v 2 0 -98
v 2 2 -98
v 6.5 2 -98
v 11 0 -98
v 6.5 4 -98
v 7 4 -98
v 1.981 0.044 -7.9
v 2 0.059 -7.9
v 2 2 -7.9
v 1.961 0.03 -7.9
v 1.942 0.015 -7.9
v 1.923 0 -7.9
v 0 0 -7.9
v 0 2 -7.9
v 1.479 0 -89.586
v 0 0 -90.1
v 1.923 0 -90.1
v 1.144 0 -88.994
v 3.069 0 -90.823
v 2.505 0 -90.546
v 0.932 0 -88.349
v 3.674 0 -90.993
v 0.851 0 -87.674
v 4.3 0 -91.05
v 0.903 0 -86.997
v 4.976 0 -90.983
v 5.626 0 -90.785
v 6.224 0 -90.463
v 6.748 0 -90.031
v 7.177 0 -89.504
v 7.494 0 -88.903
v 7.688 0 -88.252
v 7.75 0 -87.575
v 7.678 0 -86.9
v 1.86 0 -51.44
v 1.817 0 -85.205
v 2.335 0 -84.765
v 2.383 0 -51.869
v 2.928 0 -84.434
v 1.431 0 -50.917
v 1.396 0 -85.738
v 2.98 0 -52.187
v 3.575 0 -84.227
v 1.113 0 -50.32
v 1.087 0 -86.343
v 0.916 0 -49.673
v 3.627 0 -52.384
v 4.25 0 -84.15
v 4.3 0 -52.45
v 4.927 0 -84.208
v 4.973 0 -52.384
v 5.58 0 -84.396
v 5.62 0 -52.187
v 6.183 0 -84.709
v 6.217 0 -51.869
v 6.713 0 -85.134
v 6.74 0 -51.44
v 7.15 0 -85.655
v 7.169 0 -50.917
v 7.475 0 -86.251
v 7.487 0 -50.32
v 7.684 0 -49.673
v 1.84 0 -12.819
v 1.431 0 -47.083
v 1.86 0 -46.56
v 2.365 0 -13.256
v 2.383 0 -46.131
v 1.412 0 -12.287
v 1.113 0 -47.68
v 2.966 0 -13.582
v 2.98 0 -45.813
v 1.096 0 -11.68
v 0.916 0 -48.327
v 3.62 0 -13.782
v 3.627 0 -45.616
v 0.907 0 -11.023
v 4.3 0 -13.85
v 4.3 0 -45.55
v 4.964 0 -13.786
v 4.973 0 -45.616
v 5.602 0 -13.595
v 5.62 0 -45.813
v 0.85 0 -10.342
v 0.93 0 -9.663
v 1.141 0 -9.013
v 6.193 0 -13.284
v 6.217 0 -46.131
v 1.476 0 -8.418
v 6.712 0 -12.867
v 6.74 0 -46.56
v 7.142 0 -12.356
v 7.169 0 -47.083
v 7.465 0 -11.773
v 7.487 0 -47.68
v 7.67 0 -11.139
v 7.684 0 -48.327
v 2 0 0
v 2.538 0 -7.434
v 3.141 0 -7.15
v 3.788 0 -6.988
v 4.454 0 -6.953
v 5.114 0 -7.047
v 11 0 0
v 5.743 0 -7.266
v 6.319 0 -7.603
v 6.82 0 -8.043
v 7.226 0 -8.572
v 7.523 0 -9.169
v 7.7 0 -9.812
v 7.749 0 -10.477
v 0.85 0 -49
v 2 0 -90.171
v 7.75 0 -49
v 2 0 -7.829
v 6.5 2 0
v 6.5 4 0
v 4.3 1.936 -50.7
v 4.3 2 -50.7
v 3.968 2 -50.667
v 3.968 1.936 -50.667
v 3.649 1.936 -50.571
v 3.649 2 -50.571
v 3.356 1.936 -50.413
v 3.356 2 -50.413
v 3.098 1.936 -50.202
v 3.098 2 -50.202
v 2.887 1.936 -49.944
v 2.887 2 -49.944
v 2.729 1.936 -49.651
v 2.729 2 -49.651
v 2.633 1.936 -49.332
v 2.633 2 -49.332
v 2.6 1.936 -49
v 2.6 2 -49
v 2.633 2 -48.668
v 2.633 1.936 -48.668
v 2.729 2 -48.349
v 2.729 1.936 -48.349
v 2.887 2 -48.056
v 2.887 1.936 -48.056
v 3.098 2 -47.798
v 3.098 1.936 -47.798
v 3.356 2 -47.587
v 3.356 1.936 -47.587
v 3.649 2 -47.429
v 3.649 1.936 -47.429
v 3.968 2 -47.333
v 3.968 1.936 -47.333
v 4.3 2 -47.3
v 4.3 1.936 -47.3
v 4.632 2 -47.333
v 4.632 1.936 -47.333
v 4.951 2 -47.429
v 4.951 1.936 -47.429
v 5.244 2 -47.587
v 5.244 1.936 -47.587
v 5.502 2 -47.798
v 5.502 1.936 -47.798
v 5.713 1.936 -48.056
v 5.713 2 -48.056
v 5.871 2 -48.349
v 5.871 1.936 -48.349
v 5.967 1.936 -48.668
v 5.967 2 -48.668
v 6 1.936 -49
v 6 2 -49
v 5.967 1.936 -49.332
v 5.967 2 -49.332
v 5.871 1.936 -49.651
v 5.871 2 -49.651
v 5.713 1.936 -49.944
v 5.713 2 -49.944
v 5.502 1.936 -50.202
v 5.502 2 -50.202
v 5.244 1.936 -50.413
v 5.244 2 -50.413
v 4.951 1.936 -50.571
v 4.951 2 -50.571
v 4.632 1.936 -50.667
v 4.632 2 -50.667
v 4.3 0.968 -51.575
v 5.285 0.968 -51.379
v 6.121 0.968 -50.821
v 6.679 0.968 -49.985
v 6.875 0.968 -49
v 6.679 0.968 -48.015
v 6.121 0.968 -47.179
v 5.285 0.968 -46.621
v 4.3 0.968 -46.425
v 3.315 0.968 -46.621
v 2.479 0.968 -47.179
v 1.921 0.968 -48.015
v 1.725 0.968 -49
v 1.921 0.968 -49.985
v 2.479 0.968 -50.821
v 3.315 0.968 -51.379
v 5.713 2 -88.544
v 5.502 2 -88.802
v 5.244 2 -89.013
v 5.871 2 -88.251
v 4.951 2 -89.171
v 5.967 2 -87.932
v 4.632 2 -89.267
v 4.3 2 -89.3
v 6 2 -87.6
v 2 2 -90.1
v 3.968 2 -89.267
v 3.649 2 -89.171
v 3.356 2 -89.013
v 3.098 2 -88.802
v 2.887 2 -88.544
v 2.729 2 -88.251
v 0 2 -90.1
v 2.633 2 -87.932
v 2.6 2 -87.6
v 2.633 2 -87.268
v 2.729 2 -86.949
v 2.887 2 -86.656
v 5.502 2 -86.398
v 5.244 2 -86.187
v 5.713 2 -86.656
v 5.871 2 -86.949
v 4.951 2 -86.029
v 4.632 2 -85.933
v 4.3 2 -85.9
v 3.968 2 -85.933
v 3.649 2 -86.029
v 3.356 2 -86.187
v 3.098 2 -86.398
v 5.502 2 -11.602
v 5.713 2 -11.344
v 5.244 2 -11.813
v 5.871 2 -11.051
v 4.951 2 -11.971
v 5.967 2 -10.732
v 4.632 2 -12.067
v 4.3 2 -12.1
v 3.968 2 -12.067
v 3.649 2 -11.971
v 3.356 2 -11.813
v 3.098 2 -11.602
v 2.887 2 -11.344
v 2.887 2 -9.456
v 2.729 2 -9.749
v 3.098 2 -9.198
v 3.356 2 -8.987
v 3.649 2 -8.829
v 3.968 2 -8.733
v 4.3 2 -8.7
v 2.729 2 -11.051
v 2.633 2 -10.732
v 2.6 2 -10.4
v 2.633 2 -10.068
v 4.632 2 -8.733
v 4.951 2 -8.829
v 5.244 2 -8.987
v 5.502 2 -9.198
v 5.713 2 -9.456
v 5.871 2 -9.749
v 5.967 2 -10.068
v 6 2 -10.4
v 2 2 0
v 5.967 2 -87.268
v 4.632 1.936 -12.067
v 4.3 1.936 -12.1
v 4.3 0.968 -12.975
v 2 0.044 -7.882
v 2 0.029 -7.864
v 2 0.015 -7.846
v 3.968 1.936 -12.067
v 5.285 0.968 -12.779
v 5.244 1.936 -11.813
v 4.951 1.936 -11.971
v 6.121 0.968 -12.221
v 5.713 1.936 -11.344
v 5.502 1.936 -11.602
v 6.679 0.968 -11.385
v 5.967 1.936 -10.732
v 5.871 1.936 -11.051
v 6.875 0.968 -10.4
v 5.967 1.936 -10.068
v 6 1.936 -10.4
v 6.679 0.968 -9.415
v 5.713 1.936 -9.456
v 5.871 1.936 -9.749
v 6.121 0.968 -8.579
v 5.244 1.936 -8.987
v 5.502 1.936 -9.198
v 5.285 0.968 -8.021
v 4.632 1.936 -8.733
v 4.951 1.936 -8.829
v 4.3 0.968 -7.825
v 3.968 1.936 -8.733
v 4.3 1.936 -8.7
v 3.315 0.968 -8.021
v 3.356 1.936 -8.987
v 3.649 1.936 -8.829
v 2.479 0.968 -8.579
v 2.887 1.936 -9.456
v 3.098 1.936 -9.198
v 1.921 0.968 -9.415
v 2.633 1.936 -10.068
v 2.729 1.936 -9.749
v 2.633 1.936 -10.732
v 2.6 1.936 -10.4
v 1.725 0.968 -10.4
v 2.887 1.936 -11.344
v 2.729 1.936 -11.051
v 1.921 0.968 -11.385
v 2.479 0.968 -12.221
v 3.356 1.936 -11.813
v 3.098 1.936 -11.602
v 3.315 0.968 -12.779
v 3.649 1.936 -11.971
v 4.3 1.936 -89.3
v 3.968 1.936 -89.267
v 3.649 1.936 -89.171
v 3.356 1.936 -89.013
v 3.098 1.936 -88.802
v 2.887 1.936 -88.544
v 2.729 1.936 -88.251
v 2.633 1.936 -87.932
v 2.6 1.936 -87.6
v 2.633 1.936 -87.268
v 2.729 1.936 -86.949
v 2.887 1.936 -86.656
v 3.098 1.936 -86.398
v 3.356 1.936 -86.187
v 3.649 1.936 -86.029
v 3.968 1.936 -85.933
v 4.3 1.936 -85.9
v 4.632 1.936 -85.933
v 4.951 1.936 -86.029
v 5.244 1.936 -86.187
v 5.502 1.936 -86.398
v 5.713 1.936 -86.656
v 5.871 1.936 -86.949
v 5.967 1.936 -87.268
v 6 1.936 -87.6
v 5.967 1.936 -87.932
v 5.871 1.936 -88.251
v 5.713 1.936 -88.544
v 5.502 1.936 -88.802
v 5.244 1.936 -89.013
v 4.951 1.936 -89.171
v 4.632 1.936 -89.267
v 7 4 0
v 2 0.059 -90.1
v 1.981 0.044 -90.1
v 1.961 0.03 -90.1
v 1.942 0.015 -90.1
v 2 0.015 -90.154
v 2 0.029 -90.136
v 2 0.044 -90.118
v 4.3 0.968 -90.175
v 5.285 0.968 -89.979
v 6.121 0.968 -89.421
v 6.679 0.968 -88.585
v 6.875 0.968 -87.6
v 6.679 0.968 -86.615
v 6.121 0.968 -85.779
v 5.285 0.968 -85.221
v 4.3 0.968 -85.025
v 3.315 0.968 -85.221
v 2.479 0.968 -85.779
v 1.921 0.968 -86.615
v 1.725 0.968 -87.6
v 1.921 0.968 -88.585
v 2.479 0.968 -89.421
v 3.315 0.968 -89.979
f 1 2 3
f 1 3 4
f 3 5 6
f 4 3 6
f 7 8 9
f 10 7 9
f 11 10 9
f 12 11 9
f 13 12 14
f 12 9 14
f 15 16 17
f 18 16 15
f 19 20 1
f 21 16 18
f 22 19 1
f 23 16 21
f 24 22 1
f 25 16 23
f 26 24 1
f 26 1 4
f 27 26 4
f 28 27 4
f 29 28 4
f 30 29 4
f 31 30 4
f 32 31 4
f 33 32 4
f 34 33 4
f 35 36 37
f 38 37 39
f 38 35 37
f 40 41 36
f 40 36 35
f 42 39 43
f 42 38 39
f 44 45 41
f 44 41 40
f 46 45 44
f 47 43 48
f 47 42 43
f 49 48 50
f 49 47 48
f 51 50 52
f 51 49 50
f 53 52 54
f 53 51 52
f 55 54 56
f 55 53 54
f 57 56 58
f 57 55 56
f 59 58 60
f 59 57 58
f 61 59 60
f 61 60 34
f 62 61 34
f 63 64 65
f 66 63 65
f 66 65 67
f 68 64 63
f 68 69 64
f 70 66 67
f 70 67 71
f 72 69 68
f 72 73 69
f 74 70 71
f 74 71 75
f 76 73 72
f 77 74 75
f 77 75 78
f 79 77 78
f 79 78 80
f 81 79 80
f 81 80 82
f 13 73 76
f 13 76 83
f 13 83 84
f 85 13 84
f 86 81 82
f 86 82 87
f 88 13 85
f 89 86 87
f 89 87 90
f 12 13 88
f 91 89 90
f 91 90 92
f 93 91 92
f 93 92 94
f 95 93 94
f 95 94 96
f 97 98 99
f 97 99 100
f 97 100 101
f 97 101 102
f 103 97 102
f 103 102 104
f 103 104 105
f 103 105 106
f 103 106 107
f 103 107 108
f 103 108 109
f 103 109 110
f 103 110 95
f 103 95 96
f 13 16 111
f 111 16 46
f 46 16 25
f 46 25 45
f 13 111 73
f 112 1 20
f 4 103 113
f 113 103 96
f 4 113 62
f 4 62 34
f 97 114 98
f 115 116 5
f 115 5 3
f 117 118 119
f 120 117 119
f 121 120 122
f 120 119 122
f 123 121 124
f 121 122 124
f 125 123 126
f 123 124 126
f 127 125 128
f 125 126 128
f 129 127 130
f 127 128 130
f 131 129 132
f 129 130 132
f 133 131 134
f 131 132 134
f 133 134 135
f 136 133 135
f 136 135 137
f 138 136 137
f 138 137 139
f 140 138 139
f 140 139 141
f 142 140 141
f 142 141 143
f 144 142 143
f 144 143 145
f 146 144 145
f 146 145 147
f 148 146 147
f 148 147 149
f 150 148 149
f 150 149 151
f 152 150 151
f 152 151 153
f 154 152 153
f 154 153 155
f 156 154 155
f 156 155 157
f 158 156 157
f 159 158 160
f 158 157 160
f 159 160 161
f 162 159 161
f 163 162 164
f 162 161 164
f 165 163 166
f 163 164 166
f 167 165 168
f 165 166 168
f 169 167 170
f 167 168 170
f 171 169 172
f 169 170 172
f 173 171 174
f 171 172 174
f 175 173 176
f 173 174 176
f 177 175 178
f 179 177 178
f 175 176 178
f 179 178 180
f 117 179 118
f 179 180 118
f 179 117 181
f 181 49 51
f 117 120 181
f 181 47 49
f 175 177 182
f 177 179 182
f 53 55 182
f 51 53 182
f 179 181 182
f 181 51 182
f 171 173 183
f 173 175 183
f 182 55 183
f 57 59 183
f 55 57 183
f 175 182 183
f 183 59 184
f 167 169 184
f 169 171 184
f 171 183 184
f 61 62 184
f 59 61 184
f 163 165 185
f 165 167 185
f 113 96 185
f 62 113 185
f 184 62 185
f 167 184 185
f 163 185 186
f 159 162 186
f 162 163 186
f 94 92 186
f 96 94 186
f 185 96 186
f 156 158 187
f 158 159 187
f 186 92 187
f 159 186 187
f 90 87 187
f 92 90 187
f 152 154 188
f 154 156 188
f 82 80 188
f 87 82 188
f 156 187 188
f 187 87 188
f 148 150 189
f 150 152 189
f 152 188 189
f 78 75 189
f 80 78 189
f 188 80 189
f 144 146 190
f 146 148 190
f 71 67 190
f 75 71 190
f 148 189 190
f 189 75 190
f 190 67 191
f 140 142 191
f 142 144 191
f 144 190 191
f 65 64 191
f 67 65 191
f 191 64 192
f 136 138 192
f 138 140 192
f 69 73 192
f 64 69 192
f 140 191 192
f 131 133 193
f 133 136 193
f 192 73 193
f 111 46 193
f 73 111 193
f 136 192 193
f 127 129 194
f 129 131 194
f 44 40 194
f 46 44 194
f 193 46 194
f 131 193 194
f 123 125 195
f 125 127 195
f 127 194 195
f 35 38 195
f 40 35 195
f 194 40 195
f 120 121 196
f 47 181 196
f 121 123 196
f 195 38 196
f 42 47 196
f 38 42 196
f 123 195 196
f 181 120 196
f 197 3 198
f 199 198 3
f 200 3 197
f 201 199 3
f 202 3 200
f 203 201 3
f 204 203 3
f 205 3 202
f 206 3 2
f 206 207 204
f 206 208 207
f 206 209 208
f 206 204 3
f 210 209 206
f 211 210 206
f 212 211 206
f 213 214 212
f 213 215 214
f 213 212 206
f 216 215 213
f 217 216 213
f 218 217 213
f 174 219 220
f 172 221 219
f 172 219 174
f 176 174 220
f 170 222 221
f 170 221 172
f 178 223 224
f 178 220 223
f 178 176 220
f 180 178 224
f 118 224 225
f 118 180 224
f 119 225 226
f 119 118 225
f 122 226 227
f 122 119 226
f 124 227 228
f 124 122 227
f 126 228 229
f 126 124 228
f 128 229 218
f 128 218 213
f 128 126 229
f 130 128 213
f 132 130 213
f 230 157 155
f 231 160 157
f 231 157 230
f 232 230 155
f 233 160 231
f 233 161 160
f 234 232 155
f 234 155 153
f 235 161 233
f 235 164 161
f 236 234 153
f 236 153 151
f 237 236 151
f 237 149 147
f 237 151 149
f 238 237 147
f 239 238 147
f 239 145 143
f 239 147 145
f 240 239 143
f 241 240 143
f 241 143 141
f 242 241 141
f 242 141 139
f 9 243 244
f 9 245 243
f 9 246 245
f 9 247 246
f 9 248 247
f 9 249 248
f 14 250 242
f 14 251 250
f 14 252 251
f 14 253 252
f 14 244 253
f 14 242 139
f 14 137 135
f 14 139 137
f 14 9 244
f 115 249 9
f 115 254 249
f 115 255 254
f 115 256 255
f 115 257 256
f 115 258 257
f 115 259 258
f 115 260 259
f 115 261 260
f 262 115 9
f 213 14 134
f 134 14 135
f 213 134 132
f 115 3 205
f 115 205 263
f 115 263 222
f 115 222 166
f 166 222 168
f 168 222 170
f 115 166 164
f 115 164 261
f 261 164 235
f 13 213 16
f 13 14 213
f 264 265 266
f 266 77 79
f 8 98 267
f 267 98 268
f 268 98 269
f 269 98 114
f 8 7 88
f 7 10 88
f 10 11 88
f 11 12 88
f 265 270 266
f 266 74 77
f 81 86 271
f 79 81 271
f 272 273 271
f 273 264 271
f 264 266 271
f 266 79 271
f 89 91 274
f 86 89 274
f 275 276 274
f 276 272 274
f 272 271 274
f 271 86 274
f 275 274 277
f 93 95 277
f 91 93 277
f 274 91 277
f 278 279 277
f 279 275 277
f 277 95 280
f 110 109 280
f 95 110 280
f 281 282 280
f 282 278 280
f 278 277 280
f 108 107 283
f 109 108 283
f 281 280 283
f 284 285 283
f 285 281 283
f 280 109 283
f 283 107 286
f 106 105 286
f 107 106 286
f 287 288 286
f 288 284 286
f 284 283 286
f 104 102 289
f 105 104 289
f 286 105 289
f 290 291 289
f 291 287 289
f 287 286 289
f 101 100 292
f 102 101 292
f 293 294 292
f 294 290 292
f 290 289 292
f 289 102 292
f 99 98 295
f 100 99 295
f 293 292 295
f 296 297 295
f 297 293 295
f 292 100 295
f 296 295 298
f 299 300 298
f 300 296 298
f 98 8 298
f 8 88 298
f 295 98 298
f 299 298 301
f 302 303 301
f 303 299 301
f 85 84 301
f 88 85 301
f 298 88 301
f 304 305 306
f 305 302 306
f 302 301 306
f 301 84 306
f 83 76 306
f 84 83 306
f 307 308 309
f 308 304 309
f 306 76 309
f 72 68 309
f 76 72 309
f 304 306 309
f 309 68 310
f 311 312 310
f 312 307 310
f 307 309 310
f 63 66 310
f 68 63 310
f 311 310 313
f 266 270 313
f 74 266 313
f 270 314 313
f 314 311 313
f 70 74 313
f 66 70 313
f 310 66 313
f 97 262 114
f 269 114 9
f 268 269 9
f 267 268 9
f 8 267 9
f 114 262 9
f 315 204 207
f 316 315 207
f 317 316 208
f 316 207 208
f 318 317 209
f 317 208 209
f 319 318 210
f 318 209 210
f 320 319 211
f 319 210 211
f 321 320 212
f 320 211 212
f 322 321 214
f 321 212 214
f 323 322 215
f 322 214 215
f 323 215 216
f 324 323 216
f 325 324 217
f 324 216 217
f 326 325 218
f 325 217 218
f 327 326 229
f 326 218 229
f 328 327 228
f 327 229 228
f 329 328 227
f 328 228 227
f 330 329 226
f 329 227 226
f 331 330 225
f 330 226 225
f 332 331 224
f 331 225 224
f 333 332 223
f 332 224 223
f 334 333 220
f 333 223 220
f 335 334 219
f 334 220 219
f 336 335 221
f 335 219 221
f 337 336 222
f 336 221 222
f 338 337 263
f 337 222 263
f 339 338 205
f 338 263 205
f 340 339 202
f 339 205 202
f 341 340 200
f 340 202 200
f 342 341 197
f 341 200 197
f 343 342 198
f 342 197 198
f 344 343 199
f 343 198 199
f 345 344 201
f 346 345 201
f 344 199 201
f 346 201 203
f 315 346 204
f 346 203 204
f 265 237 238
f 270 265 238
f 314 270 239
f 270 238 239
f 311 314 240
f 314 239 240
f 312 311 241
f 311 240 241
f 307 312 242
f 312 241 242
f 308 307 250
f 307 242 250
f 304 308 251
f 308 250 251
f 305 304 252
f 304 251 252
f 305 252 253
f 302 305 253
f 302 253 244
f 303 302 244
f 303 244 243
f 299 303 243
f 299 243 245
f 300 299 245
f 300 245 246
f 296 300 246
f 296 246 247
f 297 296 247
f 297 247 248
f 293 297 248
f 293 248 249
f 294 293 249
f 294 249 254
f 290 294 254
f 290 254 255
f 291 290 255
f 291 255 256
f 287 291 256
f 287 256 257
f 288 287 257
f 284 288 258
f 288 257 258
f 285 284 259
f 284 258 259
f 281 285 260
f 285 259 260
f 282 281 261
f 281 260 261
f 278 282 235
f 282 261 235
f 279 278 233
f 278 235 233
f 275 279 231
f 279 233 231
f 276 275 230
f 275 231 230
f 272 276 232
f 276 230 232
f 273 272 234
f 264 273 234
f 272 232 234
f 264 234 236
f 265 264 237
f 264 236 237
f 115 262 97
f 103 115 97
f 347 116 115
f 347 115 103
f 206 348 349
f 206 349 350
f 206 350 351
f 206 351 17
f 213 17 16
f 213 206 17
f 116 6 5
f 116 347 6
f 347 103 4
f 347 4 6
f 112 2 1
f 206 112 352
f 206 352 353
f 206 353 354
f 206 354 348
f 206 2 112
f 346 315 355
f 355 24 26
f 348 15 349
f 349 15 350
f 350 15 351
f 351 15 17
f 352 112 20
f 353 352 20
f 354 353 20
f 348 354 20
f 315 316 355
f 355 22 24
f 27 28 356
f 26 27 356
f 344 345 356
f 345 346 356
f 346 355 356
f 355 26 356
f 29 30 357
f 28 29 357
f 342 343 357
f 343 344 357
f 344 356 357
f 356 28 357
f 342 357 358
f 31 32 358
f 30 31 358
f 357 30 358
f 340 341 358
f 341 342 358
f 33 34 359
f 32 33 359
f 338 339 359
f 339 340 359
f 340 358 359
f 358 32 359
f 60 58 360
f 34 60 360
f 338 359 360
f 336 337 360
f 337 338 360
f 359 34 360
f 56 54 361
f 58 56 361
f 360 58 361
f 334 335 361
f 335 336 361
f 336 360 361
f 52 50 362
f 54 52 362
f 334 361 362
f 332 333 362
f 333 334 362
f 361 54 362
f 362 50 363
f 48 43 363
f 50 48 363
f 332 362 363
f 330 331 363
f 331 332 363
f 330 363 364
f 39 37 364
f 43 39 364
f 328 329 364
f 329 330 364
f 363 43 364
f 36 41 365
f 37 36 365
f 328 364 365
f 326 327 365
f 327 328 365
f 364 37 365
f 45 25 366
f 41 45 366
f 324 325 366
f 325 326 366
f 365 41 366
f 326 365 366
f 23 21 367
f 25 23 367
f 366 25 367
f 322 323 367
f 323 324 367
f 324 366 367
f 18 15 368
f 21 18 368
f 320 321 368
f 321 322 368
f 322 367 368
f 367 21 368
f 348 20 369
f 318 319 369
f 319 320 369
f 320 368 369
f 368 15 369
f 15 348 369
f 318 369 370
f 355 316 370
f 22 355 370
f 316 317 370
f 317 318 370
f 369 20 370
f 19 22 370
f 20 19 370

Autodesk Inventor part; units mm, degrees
ref_plane "YZ Plane" through (0, 0, 0) normal (1, 0, 0) x (0, 1, 0)
ref_plane "XZ Plane" through (0, 0, 0) normal (0, 1, 0) x (-1, 0, 0)
ref_plane "XY Plane" through (0, 0, 0) normal (0, 0, 1) x (1, 0, 0)
sketch "Szkic1" plane through (0, 0, 0) normal (0, 0, 1) x (1, 0, 0)
  line L0 (0, 0) -> (11, 0)
  line L1 (11, 0) -> (7, 4)
  line L2 (7, 4) -> (6.5, 4)
  line L3 (6.5, 4) -> (6.5, 2)
  line L4 (6.5, 2) -> (0, 2)
  line L5 (0, 2) -> (0, 0)
  dimension "d1" = 45
  dimension "d3" = 2
  dimension "d4" = 2
  dimension "d5" = 11
  dimension "d19" = 4.5
extrude "Wyciągnięcie proste1" add sketch "Szkic1" against normal blind 98
sketch "Szkic4" plane through (0, 0, 0) normal (0, -1, 0) x (1, 0, 0)
  line L0 (0, 0) -> (0, -98) construction
  line L1 (0, -49) -> (11, -49) construction
  line L2 (11, 0) -> (11, -98) construction
  line L3 (4.3, -10.4) -> (4.3, -49) construction
  line L4 (6.5, 0) -> (6.5, -98) construction
  point P0 (4.3, -87.6)
  dimension "d10" = 2.2
  dimension "d11" = 38.6
hole "Otwór1" at (4.3, 0, -10.4) at (4.3, 0, -49) at (4.3, 0, -87.6) direction (0, 1, 0) diameter 3.4 end through all countersink diameter 6.9 countersink angle 84.225
sketch "Szkic5" plane through (0, 2, 0) normal (0, 1, 0) x (1, 0, 0)
  line L0 (0, 0) -> (11, 0) projected
  line L1 (0, 0) -> (2, 0)
  line L2 (2, 0) -> (2, 7.9)
  line L3 (2, 7.9) -> (0, 7.9)
  line L4 (0, 7.9) -> (0, 0)
  line L5 (0, 0) -> (0, 98) construction
  line L6 (0, 49) -> (11, 49) construction
  line L7 (11, 0) -> (11, 98) construction
  line L8 (6.5, 0) -> (6.5, 98) construction
  line L9 (0, 98) -> (2, 98)
  line L10 (2, 98) -> (2, 90.1)
  line L11 (2, 90.1) -> (0, 90.1)
  line L12 (0, 90.1) -> (0, 98)
  dimension "d20" = 4.5
  dimension "d21" = 7.9
extrude "Wyciągnięcie proste2" cut sketch "Szkic5" against normal through all
properties part number "Plug"
